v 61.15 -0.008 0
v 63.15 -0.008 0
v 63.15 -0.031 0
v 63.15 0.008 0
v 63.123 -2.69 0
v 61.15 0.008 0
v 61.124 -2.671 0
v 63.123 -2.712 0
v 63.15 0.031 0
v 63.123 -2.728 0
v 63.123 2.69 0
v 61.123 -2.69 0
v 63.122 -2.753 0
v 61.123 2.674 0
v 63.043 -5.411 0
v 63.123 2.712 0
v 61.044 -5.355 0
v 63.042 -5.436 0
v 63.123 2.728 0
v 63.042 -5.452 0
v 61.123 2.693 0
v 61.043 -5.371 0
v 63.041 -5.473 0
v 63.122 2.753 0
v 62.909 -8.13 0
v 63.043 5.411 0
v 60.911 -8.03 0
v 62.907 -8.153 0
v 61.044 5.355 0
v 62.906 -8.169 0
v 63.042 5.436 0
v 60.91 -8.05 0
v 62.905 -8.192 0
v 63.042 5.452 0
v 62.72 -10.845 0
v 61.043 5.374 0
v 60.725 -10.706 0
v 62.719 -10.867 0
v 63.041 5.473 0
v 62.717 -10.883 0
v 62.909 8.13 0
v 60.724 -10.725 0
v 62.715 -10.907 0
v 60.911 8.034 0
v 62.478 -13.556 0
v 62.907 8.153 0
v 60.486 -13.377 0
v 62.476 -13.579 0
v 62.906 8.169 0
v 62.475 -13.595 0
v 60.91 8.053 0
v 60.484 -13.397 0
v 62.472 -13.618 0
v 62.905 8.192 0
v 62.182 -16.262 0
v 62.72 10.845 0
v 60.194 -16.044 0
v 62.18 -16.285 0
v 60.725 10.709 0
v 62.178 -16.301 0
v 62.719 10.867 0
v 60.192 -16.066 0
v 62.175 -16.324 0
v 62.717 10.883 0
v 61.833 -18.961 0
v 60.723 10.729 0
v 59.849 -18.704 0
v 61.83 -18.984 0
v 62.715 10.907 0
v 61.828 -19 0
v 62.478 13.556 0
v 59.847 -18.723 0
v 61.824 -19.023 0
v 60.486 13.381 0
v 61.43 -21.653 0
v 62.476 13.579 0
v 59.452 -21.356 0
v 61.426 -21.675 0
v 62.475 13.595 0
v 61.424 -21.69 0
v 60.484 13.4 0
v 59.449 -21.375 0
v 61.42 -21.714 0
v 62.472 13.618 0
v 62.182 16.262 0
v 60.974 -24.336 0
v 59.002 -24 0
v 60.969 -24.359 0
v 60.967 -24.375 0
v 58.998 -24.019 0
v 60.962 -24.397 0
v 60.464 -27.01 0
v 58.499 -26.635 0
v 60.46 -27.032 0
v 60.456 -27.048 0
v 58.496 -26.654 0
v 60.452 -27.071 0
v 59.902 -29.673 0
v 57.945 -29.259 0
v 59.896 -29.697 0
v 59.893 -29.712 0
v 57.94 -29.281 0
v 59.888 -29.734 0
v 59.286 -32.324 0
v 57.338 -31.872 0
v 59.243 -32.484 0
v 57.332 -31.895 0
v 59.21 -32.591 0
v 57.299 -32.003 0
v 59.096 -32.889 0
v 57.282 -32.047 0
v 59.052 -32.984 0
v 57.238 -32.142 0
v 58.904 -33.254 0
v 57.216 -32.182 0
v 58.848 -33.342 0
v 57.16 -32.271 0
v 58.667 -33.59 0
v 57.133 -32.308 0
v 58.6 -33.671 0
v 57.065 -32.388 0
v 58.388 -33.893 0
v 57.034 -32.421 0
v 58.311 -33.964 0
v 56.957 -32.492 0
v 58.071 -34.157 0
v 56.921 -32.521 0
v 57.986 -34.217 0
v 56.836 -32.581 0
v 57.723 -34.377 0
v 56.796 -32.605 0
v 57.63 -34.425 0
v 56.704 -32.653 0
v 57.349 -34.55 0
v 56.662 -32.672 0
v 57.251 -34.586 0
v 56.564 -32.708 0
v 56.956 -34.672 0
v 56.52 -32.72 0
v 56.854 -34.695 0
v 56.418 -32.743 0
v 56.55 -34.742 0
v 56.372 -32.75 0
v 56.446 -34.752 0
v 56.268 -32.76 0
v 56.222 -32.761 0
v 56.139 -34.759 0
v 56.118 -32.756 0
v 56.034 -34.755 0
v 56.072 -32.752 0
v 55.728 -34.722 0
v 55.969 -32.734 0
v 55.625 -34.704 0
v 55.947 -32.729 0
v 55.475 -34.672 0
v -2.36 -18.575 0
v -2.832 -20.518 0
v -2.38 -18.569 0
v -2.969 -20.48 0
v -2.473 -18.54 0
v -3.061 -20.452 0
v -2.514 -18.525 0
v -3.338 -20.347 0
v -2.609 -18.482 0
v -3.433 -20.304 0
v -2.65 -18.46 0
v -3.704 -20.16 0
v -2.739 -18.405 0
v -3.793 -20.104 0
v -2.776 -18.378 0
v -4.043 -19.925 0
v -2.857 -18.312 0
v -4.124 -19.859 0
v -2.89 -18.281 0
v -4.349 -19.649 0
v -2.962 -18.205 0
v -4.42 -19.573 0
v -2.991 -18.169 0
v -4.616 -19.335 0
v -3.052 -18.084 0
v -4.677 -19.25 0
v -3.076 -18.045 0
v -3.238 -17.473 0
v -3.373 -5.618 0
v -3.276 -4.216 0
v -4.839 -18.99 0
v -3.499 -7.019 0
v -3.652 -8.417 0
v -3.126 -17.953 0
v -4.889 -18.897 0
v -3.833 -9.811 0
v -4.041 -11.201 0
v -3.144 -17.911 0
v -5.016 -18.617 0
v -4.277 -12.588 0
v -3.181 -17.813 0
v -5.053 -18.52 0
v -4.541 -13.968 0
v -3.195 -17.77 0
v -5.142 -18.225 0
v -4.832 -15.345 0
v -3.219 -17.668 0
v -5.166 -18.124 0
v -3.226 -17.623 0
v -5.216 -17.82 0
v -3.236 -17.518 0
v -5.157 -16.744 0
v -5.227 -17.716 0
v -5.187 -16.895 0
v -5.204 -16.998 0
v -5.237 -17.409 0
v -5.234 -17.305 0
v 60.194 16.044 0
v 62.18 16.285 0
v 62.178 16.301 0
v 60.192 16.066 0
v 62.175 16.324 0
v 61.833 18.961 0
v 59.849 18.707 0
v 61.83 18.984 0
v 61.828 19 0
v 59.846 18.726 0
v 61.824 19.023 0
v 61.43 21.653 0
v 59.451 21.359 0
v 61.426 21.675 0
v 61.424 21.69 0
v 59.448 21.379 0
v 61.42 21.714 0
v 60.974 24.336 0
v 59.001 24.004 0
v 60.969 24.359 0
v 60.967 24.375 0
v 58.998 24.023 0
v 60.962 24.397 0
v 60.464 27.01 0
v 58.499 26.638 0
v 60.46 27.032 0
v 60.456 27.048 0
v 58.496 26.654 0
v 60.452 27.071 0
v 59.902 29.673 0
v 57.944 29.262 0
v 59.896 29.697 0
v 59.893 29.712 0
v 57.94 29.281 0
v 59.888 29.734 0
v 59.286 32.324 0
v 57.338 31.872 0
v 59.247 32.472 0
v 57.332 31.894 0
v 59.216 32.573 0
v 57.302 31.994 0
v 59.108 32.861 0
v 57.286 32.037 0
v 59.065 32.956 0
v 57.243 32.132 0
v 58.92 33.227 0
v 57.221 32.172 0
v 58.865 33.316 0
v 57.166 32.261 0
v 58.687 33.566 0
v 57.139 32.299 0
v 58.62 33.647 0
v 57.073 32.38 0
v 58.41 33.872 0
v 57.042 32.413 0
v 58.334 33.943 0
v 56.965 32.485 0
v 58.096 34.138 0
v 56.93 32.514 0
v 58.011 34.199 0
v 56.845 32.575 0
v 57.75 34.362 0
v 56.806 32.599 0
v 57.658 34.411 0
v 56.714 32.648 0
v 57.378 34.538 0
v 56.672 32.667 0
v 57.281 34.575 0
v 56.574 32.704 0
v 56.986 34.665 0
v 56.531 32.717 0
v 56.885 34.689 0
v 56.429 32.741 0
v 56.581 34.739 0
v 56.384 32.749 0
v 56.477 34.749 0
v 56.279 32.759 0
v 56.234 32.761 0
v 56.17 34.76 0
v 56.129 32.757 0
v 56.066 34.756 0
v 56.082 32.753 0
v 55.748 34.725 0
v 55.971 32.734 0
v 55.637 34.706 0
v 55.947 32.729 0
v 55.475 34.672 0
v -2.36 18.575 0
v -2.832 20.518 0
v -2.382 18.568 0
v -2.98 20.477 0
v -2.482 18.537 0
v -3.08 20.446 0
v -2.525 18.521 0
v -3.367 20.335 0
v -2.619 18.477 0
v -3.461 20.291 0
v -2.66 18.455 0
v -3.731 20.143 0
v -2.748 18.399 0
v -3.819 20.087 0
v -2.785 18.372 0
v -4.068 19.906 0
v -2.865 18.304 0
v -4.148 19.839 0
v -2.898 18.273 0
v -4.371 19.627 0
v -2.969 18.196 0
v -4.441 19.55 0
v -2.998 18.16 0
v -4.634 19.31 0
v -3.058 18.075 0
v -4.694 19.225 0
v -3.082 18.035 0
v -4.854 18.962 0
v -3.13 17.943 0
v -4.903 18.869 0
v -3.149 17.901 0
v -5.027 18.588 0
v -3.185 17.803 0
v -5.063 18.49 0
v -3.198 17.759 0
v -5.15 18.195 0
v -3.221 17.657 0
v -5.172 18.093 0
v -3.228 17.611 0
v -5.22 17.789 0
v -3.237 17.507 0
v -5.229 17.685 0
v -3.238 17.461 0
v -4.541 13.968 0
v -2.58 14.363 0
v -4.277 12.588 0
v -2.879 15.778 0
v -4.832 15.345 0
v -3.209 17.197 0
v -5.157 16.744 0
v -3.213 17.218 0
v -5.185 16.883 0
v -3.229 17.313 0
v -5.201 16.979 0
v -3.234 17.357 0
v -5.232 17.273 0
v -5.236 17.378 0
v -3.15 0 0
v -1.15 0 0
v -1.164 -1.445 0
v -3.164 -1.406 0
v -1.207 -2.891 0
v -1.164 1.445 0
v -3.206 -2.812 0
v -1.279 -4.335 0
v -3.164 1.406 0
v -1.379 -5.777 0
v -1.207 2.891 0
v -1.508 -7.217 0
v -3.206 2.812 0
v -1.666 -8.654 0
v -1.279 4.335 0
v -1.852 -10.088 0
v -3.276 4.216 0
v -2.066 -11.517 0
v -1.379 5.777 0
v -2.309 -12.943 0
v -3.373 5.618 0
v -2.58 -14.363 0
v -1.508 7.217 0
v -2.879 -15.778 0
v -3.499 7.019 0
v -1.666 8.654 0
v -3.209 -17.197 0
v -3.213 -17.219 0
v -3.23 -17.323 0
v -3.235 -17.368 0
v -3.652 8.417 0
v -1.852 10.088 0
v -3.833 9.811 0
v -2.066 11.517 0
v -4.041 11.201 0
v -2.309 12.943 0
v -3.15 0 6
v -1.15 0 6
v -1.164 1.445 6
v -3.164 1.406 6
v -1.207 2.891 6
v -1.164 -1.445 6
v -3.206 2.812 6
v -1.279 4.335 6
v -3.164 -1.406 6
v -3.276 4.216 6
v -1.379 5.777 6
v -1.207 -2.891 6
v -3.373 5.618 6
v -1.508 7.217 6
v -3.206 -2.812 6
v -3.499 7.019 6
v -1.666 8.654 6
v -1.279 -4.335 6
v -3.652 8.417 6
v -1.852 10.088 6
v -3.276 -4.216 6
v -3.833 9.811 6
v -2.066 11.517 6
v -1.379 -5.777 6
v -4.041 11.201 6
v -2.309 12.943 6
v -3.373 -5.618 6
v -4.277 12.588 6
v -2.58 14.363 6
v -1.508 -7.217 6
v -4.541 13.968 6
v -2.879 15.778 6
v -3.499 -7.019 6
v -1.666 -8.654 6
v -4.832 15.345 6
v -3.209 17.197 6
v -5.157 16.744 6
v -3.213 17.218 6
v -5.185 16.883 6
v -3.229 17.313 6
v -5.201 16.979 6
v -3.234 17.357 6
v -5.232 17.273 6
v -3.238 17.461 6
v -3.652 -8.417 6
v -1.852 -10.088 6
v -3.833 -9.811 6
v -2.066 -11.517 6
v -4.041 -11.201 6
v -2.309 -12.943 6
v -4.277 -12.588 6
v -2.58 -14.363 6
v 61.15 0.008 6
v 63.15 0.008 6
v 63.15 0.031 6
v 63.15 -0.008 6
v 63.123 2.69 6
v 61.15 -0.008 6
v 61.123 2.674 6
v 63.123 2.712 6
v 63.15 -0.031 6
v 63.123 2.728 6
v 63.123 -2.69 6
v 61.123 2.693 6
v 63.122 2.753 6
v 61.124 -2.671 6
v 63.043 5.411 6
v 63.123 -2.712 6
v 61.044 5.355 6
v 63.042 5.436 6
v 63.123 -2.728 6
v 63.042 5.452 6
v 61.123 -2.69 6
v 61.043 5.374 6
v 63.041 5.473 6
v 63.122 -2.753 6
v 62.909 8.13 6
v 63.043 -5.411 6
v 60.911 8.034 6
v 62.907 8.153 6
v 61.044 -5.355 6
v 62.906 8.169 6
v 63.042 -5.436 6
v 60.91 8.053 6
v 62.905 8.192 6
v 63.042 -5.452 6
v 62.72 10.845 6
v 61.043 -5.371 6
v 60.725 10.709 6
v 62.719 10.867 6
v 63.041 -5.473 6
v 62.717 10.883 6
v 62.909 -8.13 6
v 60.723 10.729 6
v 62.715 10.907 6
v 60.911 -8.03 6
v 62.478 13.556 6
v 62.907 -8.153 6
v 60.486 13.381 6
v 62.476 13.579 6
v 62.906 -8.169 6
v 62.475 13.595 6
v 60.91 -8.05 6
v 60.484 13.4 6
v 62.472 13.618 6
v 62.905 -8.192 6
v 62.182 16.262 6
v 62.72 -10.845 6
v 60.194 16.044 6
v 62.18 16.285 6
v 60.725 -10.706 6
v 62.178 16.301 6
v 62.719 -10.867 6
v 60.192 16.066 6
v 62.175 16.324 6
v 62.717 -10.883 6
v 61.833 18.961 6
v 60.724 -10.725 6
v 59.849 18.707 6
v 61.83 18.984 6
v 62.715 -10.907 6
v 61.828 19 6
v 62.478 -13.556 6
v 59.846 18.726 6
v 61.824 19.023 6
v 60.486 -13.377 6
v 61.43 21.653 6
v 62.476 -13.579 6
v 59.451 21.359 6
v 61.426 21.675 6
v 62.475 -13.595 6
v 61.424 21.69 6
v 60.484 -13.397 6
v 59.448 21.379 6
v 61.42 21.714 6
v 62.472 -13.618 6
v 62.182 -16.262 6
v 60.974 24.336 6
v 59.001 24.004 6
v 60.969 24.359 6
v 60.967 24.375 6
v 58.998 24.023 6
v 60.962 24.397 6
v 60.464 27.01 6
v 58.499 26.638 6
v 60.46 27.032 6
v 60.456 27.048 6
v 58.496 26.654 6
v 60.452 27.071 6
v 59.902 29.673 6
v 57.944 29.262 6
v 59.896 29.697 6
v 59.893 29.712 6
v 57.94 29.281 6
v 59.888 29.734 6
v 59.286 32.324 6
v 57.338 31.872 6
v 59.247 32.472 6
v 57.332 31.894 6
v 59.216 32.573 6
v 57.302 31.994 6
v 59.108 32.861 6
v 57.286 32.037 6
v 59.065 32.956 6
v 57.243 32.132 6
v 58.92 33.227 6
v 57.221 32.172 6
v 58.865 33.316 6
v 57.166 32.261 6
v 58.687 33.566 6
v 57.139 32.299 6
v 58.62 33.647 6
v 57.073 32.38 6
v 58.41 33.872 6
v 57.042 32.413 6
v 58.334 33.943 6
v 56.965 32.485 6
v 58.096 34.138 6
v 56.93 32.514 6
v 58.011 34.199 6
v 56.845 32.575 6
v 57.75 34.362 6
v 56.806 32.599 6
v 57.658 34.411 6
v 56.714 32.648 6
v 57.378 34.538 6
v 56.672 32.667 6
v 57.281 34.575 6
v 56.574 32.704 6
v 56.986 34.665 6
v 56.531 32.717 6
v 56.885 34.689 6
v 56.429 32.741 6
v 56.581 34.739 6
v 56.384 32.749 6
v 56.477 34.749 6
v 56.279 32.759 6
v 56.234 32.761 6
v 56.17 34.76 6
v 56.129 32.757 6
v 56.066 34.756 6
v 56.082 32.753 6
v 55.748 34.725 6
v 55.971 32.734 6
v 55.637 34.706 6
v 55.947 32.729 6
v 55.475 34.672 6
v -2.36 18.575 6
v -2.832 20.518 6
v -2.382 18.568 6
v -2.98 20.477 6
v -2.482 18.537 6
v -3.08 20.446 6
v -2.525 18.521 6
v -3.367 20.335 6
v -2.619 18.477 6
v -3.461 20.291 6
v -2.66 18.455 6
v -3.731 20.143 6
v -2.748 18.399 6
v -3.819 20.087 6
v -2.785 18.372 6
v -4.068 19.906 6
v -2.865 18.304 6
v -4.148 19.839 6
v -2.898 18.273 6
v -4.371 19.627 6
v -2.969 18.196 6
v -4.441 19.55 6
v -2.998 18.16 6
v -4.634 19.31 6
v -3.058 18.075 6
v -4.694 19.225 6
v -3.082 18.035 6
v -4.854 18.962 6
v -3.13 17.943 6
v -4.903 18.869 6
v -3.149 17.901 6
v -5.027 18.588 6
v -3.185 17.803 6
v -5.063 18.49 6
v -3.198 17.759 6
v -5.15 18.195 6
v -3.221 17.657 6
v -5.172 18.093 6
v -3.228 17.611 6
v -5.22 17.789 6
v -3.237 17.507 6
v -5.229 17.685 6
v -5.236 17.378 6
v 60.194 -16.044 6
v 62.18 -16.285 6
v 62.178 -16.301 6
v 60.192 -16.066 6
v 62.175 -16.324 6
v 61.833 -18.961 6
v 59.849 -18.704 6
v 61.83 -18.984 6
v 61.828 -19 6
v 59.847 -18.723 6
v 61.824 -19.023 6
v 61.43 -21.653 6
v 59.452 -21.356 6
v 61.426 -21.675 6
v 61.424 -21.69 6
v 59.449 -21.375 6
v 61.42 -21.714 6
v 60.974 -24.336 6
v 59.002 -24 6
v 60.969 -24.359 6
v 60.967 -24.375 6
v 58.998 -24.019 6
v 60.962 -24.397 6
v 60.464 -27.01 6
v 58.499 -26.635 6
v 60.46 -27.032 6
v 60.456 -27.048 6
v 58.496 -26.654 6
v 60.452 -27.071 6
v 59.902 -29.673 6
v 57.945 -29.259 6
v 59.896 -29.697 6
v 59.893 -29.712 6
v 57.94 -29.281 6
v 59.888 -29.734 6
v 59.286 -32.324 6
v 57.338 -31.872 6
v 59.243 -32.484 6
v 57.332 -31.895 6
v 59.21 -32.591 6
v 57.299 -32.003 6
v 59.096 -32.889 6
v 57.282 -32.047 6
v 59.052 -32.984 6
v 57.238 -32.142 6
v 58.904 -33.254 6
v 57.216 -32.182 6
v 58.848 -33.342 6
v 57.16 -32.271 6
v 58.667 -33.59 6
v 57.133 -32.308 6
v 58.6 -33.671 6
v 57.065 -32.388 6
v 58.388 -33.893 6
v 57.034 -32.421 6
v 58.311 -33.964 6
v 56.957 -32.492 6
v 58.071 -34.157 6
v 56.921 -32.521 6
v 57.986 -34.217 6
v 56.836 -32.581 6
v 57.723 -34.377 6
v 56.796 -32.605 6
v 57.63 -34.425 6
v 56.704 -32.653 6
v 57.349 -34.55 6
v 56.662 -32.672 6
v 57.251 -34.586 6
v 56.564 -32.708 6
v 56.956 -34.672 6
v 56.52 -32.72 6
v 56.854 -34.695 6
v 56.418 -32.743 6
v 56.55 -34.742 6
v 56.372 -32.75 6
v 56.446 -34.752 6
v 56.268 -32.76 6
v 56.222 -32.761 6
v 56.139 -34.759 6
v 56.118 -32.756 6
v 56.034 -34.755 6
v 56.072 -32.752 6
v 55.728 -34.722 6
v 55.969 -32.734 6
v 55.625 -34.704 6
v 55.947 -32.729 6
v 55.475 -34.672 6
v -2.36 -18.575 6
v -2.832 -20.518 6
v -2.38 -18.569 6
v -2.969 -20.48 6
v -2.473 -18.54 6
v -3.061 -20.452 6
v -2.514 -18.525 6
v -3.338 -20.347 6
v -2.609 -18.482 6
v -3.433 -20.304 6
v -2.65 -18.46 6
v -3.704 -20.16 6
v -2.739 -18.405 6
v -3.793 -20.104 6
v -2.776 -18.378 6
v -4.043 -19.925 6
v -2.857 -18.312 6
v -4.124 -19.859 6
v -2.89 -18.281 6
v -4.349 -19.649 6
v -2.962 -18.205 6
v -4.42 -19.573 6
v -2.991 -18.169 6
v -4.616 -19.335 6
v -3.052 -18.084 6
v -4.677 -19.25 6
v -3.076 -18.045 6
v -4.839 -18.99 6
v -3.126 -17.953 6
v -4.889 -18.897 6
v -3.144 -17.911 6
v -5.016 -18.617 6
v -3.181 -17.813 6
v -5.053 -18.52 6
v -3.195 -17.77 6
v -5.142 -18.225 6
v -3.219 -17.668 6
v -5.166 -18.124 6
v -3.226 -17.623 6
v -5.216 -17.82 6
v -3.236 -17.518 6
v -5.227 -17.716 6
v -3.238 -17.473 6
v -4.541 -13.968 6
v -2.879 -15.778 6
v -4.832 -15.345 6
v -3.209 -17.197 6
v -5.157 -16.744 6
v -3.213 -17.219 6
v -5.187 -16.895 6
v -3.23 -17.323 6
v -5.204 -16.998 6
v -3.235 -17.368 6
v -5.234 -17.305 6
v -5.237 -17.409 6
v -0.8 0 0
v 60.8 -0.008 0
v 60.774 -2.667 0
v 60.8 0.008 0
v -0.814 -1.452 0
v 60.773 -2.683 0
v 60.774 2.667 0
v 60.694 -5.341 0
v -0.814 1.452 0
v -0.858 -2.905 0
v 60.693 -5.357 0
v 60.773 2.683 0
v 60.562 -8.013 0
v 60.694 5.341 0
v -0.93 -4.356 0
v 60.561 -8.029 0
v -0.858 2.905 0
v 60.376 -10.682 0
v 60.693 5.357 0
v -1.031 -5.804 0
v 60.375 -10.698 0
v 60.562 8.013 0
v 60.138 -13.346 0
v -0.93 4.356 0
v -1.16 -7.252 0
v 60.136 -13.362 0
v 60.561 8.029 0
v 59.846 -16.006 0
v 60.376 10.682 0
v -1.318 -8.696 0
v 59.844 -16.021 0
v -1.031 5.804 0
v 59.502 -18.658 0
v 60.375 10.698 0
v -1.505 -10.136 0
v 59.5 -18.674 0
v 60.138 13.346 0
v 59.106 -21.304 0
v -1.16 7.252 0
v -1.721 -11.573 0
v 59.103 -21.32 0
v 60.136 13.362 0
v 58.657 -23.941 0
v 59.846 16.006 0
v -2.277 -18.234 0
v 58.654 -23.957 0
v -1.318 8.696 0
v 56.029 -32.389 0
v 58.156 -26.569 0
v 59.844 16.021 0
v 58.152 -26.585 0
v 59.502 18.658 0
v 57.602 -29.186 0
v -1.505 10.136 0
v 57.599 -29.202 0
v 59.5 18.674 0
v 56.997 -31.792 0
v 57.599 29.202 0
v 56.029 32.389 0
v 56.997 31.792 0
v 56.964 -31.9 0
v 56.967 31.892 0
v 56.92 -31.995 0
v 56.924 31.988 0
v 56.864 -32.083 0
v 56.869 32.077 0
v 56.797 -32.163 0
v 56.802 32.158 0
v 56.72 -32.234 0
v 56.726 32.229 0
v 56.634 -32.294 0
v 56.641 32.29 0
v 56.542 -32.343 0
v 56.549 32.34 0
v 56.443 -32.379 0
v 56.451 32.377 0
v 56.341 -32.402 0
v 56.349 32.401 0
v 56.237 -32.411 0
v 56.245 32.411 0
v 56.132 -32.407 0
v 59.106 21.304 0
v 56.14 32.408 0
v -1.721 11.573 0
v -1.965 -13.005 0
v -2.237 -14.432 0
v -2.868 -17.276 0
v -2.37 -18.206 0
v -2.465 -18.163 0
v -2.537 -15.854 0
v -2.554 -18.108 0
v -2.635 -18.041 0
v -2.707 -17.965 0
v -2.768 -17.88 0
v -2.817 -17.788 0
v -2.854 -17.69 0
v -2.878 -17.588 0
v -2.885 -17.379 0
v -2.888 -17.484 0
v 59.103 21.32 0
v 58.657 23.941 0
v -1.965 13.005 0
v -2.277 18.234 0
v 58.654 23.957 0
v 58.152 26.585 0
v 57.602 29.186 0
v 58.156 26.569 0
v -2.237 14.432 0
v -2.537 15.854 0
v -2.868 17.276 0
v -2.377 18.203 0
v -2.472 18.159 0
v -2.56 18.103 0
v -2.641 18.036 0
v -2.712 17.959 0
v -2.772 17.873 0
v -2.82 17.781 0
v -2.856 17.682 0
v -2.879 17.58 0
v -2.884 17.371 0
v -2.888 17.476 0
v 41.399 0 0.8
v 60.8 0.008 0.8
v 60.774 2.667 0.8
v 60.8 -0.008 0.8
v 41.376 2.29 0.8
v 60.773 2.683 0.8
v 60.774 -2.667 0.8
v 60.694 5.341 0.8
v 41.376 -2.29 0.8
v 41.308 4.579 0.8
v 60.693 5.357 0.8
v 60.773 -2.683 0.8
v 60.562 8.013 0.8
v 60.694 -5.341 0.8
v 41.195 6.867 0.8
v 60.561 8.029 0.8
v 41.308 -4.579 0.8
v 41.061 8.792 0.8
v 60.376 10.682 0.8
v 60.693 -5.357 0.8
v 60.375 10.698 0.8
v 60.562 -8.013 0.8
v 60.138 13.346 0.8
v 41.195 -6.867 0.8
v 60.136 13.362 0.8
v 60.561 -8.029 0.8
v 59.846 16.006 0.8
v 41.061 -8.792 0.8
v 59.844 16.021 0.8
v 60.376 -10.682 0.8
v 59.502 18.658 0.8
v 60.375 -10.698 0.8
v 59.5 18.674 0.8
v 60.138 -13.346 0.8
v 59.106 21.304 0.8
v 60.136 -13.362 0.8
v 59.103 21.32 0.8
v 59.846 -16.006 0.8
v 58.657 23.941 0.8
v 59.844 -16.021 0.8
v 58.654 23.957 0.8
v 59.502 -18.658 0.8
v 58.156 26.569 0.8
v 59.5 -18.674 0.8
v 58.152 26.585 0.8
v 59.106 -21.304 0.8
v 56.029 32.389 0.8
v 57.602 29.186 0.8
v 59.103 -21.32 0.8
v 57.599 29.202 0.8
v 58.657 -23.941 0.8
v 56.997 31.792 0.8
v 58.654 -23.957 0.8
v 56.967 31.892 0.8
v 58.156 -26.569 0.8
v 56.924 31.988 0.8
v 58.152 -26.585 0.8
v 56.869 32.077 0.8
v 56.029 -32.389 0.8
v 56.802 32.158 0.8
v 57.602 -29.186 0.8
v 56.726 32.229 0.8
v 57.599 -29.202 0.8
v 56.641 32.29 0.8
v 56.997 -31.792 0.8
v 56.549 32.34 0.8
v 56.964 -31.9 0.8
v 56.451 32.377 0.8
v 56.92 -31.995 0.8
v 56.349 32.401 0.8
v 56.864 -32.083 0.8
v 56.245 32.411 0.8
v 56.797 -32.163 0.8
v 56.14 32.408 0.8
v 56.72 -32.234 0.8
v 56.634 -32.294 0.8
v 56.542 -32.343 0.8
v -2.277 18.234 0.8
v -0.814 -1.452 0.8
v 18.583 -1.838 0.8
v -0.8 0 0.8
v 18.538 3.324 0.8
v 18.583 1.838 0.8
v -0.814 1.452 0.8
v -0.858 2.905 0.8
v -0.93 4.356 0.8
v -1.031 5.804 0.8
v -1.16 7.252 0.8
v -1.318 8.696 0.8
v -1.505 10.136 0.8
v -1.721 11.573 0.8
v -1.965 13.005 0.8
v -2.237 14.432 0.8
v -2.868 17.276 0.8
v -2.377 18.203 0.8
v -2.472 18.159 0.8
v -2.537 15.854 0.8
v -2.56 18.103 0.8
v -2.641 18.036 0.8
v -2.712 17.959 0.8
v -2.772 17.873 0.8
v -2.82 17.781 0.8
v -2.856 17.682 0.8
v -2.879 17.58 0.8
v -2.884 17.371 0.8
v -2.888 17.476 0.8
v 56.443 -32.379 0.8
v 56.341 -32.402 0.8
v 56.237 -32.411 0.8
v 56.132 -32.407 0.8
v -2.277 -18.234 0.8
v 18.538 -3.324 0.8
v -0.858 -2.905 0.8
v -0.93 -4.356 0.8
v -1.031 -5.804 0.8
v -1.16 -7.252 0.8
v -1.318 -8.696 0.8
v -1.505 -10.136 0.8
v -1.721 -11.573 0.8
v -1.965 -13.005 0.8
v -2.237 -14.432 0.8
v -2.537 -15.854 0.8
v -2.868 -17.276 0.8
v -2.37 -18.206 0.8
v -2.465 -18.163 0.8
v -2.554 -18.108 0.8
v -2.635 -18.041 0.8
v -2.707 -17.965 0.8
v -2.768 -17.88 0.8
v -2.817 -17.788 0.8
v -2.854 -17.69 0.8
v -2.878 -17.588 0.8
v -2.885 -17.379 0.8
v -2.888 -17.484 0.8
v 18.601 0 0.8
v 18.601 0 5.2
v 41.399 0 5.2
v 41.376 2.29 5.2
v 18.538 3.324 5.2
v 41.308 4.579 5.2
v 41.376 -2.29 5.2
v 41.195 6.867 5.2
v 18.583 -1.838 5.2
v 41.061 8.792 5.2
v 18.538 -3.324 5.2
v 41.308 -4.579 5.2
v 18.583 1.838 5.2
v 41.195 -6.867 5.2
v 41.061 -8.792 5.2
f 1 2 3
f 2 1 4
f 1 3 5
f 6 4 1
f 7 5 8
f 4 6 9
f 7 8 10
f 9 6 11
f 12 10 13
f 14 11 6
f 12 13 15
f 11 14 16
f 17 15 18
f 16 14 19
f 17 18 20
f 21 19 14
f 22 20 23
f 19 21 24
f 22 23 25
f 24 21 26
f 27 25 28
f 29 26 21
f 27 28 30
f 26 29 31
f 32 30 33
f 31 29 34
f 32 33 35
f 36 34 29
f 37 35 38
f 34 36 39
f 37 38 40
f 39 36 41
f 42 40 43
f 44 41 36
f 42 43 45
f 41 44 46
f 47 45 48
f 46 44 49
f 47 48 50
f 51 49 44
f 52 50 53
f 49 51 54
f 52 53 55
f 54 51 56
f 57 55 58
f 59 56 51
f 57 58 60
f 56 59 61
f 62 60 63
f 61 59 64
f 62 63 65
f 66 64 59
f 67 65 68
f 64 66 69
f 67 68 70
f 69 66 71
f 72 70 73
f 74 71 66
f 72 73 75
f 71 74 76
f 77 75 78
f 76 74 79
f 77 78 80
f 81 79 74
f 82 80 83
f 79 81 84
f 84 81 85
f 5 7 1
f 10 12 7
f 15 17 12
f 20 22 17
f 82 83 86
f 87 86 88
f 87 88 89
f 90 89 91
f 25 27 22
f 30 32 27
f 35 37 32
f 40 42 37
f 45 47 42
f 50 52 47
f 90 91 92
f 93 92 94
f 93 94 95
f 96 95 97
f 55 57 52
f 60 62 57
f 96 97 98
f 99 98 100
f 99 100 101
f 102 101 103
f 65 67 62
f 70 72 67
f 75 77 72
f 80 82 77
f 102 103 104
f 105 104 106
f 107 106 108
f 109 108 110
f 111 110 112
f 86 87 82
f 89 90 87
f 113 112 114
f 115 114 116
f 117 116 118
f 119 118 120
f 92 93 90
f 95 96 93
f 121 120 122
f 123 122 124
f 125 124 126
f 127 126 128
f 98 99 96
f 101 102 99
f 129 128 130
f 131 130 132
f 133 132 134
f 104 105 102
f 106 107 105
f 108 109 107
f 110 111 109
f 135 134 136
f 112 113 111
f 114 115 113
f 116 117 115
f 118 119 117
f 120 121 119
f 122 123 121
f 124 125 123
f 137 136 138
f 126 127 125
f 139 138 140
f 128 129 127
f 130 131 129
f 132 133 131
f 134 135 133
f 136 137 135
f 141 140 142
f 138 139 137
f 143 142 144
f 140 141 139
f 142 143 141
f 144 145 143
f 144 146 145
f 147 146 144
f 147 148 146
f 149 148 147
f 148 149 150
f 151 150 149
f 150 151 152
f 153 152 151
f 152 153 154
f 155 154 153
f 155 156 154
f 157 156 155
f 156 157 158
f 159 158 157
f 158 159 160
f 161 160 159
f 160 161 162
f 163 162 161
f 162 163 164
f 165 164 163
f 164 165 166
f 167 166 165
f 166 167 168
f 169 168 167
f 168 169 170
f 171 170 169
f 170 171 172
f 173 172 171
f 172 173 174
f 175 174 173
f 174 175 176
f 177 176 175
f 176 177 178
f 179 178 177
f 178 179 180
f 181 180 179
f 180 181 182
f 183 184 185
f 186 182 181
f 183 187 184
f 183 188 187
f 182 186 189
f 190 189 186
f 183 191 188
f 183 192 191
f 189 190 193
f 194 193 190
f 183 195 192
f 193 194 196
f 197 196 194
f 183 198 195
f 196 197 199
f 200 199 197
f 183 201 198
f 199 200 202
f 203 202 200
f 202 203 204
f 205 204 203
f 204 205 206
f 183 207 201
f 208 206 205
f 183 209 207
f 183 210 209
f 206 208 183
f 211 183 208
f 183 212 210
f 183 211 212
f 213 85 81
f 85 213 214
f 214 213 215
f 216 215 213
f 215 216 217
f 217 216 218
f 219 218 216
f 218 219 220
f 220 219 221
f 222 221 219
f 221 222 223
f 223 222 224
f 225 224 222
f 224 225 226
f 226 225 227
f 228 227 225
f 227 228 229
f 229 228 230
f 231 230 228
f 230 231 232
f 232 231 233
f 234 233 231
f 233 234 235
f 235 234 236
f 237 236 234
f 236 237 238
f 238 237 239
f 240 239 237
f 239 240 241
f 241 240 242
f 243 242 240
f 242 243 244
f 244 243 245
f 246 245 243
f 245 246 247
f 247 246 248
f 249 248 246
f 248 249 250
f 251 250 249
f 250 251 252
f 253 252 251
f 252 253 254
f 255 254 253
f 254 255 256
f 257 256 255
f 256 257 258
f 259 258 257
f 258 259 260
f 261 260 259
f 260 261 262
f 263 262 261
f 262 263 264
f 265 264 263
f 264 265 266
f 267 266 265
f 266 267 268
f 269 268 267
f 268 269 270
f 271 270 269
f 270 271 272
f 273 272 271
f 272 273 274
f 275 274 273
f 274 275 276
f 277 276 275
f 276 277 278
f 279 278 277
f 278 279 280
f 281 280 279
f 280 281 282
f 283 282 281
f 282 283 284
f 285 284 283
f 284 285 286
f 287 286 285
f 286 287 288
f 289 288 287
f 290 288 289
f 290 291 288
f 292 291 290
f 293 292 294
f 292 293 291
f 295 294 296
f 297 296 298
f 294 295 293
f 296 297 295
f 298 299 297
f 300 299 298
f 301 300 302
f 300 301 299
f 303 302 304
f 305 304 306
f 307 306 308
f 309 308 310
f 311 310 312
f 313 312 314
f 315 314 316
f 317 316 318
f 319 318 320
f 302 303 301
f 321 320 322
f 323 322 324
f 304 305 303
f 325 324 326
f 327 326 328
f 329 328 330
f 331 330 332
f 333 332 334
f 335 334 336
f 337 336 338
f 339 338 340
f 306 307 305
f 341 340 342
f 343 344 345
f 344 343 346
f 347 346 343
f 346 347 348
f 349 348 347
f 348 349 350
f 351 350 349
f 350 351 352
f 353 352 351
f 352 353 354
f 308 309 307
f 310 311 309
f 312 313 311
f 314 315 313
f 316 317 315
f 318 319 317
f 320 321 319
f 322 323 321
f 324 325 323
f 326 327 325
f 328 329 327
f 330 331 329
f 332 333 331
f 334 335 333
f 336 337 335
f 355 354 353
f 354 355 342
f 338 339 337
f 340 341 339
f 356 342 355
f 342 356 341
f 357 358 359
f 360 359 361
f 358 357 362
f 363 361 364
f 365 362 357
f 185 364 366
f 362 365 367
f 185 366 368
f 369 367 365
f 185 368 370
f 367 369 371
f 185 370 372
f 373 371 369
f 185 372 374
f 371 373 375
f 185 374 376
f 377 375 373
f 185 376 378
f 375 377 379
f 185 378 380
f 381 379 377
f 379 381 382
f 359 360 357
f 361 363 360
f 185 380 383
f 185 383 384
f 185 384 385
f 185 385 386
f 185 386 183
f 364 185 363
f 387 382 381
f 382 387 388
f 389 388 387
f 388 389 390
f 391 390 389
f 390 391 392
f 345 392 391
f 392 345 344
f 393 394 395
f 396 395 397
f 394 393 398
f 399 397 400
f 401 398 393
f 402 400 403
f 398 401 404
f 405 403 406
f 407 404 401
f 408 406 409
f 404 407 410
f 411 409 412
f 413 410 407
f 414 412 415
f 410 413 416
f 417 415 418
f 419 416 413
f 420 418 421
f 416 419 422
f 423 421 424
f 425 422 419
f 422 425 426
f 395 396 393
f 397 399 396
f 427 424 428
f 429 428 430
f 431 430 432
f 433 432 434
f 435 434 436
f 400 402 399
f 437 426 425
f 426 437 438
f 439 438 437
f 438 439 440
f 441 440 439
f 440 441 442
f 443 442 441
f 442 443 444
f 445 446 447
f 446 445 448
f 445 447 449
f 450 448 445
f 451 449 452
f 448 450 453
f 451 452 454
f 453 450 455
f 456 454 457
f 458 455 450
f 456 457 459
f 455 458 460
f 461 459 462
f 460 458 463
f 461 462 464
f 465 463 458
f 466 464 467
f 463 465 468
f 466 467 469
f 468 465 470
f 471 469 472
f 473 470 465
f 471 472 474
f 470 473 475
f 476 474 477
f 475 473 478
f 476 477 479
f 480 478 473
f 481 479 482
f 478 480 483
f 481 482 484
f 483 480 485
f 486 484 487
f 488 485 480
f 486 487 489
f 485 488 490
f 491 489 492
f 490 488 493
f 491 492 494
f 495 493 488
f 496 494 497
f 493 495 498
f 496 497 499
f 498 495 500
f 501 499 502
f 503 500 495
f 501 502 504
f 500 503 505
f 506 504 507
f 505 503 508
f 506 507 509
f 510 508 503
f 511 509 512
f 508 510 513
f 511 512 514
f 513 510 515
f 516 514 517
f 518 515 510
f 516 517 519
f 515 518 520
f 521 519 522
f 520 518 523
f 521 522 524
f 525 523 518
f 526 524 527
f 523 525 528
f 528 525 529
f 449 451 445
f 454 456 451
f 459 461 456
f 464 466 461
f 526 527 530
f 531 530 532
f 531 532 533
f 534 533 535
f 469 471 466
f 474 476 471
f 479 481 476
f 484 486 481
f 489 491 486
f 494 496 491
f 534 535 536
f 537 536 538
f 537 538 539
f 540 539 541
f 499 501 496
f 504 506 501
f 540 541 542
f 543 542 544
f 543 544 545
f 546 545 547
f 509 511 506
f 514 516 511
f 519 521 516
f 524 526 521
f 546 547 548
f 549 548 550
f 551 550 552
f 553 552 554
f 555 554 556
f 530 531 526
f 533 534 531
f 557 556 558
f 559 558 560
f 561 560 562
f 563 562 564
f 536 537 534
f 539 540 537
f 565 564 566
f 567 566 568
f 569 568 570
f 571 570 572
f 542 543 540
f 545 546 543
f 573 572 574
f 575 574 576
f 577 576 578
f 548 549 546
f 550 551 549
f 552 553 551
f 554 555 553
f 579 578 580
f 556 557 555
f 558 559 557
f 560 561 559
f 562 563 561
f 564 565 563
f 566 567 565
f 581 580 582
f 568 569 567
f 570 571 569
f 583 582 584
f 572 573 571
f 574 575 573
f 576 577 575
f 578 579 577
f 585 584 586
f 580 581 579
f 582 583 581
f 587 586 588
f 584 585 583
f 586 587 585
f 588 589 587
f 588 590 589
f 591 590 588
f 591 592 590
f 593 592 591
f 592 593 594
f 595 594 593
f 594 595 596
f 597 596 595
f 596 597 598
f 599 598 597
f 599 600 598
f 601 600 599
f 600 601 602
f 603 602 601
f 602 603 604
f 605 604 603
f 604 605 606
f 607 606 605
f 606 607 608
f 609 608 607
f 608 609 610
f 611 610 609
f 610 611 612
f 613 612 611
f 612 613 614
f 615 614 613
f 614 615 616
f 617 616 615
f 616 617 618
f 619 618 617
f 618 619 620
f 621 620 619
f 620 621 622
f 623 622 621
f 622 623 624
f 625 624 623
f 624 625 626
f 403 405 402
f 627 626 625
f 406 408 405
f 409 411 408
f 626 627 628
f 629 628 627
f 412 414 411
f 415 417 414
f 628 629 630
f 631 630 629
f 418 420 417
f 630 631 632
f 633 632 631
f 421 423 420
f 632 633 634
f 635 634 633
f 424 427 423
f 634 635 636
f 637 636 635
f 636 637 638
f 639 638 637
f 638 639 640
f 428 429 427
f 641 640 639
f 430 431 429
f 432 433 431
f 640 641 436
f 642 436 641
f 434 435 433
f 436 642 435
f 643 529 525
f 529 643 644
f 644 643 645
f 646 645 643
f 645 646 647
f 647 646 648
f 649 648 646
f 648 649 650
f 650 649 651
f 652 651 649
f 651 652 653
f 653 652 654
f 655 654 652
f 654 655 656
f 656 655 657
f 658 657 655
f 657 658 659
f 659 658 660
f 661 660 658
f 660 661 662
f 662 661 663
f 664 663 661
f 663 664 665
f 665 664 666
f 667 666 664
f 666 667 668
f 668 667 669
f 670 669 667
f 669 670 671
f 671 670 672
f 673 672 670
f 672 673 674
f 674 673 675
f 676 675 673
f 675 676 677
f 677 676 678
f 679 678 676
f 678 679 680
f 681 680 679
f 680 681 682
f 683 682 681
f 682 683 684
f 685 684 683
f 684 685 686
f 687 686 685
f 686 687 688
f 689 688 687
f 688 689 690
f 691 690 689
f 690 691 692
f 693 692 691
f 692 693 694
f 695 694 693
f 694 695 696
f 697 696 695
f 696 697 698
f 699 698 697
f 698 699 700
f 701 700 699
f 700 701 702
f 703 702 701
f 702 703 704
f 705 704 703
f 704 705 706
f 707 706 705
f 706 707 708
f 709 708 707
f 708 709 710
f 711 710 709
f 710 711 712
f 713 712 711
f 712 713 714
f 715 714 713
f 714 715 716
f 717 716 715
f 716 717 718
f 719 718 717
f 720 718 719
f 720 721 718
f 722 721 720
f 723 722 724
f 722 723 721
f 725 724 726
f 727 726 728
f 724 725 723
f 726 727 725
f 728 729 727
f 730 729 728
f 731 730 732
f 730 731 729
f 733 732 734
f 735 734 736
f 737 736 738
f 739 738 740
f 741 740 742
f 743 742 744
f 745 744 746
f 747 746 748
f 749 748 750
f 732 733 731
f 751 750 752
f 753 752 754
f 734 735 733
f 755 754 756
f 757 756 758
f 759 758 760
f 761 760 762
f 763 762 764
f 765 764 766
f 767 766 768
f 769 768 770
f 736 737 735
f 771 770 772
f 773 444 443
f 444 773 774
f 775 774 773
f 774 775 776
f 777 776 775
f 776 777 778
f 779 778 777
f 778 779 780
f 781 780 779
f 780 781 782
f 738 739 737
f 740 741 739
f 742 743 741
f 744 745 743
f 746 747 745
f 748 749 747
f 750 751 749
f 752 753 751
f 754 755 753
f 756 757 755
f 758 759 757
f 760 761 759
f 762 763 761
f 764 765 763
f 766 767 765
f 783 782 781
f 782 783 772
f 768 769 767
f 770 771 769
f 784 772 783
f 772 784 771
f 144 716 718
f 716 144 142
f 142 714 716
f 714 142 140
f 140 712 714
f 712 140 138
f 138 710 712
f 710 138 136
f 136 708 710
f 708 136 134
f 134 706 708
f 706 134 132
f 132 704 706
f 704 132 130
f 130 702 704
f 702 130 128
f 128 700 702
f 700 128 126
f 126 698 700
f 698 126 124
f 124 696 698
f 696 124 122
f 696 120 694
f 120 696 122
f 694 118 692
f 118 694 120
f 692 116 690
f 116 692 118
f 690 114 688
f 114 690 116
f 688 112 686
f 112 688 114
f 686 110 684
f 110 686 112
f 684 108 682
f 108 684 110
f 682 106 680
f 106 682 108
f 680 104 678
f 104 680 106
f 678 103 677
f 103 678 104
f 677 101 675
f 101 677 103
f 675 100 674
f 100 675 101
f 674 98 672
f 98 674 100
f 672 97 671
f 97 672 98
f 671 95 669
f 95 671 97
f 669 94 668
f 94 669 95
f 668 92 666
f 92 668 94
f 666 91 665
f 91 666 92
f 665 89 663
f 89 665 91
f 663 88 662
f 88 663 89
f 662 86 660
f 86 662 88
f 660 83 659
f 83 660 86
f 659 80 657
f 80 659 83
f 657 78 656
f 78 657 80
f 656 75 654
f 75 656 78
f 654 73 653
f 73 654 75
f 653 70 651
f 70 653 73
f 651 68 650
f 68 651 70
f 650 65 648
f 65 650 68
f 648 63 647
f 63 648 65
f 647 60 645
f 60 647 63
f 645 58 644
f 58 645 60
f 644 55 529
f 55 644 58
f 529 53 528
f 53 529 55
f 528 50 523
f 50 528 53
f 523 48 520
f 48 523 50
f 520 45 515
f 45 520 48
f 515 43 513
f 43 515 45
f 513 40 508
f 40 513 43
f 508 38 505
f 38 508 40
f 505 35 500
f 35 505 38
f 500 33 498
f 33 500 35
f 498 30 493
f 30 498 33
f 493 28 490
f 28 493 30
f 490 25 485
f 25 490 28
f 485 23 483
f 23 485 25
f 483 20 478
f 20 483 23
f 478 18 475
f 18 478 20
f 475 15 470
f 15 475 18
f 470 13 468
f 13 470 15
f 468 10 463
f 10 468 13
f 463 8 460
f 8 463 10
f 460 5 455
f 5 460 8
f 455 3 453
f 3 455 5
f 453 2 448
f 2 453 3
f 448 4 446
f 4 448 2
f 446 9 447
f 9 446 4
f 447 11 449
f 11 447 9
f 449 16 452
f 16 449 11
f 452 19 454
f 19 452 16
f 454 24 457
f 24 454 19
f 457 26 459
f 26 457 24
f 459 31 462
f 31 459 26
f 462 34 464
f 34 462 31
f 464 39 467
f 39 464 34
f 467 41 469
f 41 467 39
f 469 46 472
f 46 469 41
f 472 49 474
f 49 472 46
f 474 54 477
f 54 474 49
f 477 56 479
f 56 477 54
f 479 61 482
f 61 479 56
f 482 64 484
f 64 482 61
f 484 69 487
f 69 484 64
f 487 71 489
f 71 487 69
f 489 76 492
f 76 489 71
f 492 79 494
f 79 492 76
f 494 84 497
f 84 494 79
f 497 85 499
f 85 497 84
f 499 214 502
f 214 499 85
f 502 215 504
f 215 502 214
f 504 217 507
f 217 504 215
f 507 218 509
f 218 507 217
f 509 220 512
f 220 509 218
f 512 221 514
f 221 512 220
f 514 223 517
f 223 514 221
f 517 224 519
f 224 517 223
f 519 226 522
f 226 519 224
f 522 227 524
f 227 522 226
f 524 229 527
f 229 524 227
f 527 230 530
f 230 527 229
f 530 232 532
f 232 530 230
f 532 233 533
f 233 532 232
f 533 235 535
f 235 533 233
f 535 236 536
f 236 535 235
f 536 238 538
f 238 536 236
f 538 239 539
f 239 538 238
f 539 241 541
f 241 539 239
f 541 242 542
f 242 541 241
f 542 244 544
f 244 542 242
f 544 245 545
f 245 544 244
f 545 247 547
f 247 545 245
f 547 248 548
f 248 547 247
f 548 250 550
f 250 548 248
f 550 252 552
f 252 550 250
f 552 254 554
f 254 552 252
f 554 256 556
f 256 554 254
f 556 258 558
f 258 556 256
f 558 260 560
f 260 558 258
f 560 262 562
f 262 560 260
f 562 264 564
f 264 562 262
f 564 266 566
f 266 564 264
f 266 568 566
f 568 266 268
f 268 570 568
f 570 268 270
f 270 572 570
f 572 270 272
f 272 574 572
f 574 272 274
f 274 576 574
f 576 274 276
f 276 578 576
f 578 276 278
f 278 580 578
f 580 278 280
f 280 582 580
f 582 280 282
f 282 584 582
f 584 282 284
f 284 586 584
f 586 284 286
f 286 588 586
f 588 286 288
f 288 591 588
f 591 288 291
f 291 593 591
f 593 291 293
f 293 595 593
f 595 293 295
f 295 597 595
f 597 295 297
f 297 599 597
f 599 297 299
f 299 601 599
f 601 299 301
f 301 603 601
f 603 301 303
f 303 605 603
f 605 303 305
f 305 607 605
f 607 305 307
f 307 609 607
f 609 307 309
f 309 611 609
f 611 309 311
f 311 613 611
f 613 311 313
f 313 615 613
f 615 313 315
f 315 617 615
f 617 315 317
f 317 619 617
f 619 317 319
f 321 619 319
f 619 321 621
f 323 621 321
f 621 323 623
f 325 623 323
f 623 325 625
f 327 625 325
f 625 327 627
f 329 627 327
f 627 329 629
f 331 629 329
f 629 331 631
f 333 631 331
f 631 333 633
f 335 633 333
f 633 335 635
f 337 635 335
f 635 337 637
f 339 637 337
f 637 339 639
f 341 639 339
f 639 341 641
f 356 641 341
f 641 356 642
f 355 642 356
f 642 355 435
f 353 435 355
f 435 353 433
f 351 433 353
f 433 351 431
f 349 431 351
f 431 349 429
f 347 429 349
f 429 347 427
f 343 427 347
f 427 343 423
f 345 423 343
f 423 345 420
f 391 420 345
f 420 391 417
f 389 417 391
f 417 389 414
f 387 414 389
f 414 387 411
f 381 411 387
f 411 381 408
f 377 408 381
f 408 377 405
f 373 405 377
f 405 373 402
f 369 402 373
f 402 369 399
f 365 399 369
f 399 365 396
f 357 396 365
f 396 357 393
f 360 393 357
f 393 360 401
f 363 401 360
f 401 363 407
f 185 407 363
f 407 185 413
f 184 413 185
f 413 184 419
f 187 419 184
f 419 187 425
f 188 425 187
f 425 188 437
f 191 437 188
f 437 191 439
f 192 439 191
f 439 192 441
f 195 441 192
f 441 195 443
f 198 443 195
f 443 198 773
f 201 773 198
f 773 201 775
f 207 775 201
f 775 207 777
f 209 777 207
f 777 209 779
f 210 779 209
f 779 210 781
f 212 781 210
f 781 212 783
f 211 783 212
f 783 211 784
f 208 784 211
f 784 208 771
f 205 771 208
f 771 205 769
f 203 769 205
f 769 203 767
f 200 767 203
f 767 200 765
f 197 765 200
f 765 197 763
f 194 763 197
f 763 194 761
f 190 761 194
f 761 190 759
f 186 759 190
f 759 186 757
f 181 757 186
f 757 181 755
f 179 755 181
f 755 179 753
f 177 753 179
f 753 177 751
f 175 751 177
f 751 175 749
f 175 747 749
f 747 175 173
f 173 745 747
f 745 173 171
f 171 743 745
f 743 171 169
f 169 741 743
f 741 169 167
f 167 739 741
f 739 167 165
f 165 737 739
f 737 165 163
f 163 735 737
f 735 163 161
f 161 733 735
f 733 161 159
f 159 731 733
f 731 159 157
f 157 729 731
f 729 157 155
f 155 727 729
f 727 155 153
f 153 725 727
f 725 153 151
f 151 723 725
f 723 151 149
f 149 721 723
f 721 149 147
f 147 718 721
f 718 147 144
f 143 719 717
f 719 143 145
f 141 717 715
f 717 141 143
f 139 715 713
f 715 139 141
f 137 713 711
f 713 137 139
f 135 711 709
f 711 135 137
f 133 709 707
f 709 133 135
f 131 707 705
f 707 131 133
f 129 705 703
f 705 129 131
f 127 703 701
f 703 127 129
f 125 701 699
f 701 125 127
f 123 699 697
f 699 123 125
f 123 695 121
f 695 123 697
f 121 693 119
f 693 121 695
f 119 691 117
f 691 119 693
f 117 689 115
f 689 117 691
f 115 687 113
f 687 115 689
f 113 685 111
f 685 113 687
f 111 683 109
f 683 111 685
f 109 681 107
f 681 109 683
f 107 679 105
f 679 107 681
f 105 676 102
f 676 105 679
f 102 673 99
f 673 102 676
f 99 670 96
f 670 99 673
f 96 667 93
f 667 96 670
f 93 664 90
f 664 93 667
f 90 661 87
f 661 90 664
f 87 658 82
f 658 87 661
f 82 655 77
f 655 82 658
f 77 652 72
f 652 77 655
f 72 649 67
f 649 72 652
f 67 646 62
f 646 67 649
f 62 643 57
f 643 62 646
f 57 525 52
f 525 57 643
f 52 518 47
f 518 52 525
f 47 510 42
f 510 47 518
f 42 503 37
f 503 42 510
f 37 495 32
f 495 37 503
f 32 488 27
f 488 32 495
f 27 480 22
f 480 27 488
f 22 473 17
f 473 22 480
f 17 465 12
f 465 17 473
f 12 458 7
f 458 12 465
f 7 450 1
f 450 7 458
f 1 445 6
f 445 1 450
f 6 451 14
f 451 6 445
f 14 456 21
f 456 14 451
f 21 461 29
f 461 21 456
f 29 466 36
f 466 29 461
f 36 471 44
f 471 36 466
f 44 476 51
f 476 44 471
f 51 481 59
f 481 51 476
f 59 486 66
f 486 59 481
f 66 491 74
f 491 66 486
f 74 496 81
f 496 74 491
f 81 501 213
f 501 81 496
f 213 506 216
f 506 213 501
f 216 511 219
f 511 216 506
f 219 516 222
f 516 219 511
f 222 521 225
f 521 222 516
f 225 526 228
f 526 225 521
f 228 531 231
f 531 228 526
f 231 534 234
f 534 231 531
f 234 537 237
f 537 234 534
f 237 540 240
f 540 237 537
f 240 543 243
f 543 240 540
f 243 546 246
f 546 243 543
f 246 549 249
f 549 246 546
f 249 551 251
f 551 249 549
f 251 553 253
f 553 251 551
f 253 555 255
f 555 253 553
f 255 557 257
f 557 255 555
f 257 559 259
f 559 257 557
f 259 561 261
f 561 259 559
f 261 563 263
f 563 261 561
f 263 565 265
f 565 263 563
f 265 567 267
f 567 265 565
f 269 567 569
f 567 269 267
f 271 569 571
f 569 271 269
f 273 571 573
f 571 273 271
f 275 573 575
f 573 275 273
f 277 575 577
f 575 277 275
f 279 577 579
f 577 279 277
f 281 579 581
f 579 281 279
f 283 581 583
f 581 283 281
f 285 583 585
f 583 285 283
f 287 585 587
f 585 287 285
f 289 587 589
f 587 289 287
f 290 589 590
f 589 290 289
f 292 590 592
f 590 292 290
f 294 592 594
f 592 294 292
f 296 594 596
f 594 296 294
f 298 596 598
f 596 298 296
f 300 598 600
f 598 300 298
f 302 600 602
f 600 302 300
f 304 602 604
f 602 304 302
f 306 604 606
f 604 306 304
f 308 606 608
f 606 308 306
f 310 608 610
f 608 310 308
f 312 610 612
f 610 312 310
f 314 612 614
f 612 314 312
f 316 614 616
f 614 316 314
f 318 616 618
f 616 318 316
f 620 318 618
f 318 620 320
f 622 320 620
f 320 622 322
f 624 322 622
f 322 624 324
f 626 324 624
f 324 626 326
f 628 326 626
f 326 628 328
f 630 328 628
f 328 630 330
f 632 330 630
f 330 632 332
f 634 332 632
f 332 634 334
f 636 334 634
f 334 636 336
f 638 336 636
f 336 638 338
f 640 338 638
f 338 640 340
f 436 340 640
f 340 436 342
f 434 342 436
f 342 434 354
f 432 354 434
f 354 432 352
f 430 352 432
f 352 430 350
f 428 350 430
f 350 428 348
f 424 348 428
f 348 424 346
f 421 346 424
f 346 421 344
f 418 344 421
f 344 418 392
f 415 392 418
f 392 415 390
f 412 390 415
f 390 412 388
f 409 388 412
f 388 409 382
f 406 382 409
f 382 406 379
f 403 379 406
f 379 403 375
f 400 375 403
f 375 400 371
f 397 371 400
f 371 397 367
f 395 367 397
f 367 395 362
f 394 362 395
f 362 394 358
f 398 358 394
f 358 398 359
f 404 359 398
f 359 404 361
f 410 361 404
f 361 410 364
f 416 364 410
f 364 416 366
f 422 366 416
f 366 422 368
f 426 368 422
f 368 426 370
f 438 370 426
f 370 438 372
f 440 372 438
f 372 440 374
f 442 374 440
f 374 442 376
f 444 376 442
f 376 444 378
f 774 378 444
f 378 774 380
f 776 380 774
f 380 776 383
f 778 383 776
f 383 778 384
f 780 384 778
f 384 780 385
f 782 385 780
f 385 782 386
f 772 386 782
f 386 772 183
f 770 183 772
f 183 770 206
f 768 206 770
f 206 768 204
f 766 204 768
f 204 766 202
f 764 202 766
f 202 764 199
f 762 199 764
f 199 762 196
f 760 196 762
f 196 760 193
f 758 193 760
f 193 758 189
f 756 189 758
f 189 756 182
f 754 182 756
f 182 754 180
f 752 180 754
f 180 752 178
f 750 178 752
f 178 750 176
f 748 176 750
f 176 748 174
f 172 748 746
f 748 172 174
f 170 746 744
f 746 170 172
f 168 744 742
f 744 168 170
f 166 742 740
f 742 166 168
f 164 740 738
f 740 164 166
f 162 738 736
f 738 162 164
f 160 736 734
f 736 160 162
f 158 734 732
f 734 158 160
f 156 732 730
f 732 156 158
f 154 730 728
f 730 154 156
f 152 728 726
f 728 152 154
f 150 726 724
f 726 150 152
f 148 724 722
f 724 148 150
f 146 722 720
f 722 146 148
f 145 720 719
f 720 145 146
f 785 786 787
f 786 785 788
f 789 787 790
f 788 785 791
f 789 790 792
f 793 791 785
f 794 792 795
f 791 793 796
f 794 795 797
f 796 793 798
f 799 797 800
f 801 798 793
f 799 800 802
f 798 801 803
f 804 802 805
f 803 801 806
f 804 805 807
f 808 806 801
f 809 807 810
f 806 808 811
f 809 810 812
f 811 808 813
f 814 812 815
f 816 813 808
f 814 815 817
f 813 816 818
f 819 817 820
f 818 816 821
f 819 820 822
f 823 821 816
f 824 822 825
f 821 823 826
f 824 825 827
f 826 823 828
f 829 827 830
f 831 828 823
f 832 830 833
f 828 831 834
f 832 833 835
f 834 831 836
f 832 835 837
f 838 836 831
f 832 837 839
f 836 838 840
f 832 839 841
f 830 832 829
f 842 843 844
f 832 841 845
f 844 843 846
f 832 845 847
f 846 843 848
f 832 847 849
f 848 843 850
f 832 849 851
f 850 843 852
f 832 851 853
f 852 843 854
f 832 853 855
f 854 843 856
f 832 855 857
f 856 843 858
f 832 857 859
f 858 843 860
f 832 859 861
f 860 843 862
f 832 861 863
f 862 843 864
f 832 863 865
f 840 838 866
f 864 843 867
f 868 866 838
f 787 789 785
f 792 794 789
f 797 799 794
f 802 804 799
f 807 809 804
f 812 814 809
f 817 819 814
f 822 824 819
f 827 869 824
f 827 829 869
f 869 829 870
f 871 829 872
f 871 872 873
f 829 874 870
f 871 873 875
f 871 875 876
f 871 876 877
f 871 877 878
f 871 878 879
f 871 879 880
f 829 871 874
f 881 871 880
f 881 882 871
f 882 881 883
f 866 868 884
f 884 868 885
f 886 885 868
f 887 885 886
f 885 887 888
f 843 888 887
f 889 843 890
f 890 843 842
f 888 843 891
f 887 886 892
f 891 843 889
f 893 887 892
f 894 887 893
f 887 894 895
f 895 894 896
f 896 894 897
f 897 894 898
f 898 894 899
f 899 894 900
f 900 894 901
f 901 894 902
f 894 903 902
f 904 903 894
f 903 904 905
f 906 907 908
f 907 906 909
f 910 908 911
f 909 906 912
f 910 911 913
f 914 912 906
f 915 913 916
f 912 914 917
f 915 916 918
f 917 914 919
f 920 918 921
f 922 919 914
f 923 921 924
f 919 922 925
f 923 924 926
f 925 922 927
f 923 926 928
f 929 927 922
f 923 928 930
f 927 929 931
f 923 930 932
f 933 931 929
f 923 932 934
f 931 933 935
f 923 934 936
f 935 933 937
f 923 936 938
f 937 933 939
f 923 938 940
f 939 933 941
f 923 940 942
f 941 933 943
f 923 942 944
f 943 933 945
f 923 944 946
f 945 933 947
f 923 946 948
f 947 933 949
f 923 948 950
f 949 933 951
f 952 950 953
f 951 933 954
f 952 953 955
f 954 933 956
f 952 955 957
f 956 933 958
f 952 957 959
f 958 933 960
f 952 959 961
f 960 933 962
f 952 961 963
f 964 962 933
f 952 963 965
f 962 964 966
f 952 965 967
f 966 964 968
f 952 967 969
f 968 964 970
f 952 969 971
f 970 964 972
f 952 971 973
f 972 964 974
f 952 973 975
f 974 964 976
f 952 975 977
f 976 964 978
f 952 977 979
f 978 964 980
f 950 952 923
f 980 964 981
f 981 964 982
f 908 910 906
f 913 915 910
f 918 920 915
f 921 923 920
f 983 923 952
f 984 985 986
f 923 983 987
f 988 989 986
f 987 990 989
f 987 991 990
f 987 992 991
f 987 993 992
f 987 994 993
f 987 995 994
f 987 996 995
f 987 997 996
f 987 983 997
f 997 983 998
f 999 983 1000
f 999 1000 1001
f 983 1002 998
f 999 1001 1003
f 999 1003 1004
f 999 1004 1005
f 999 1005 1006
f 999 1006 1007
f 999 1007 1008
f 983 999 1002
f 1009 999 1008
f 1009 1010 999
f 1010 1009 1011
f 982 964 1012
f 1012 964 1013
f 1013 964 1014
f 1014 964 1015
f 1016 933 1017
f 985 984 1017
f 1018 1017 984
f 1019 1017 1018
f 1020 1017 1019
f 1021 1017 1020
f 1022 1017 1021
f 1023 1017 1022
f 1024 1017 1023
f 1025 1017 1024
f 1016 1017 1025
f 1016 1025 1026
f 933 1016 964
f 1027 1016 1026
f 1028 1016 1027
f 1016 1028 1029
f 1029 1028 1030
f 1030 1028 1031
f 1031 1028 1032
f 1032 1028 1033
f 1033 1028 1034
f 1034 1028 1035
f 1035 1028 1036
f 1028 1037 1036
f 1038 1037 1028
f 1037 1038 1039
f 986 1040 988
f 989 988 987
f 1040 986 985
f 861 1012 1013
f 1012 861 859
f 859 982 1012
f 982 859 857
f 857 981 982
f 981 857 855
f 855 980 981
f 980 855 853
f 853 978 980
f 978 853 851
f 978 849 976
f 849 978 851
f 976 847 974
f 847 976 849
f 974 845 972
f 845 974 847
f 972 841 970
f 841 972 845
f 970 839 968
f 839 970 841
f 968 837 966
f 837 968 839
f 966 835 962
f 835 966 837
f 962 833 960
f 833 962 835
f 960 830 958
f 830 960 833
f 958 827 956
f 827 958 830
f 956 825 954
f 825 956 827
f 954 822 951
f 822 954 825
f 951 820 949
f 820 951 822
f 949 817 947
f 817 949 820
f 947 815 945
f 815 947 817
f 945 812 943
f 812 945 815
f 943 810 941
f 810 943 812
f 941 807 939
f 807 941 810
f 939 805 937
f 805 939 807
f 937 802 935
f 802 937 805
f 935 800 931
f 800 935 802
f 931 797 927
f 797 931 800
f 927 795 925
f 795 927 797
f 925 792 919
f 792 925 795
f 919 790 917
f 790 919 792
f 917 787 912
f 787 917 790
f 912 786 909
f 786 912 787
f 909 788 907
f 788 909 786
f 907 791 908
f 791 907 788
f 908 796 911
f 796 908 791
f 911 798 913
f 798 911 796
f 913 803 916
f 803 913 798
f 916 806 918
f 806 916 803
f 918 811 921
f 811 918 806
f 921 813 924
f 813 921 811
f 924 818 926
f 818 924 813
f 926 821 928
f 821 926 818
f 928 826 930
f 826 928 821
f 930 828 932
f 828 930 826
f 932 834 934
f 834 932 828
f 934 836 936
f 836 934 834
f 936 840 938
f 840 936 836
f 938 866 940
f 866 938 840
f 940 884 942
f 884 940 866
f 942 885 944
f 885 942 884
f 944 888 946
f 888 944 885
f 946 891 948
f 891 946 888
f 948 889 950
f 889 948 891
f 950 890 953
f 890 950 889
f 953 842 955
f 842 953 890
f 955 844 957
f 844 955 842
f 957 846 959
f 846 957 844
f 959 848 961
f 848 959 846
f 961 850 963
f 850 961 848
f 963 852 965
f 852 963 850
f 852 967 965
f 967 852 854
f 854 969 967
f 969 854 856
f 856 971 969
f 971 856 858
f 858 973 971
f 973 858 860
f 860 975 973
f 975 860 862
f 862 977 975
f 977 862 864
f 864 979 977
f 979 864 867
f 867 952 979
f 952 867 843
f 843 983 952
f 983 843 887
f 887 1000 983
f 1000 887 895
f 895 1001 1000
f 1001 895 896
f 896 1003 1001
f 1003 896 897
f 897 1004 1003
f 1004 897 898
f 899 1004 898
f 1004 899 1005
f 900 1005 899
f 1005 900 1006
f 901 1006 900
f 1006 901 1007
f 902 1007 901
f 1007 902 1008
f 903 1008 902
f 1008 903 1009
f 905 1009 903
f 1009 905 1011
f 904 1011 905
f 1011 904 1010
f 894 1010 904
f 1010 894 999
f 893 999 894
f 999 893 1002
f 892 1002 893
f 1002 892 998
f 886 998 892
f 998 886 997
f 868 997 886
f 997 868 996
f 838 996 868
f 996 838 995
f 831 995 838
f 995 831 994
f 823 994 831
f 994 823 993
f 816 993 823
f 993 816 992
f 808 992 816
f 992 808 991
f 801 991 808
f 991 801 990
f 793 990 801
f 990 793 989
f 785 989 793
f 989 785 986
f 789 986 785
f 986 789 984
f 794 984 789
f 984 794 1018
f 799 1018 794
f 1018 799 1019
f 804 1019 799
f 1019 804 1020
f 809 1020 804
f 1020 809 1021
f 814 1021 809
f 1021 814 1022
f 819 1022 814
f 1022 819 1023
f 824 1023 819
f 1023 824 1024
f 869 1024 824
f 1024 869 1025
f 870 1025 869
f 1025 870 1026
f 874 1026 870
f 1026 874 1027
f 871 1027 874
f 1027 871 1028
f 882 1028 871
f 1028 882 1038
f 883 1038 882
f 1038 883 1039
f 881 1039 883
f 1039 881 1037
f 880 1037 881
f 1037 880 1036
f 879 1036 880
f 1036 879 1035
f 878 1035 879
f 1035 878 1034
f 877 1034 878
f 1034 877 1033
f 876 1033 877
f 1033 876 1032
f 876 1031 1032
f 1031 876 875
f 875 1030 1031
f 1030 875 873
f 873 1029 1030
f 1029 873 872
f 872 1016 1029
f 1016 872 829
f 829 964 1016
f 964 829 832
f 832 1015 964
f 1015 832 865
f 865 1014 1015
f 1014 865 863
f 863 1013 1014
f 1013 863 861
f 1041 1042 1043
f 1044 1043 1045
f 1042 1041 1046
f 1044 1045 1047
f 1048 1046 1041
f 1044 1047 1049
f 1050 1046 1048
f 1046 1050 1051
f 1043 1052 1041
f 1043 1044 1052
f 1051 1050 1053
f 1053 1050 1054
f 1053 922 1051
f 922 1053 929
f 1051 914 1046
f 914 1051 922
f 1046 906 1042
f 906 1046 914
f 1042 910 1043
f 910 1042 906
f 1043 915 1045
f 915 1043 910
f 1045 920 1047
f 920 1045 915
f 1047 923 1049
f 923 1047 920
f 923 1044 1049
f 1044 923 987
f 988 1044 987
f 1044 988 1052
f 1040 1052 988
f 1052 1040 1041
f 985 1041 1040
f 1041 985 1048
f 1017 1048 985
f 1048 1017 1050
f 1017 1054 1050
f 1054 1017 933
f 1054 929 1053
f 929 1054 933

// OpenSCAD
// Gen-DI — fit coupon (bay part): O20/O5 THROUGH pockets at carrier thickness (test on a steel offcut), 608 seat,
// D-flat bore, gap shim, and one bobbin-bay slice (bobbin footprint + bay_clear) to test former fit.
include <parameters.scad>;
$fn = 48;
// D-flat keyed bore: flat faces +X (angle 0 = magnet pocket 0 = index notch)
module dflat_bore(h) {
    intersection() {
        cylinder(d=shaft_bore, h=h);
        translate([-shaft_bore, -shaft_bore, 0]) cube([shaft_bore + dflat_x, 2*shaft_bore, h]);
    }
}
module sector_2d(r_in, r_out, ang) {
    polygon([
        for (a = [-ang/2 : ang/24 : ang/2]) [r_in*cos(a), r_in*sin(a)],
        for (a = [ang/2 : -ang/24 : -ang/2]) [r_out*cos(a), r_out*sin(a)]
    ]);
}
module footprint_2d() { offset(r=wall) sector_2d(coil_id_r, coil_od_r, span_deg); }
module hub_2d()       { offset(delta=-coil_core_inset) sector_2d(coil_id_r, coil_od_r, span_deg); }

// bay slice at FULL stator thickness with one bobbin BASE printed IN PLACE inside it (bay_clear gap): this is the
// print-in-place test for the one-plate stator. After printing, the base must pop out with finger pressure; if it is fused,
// print coil_former.stl separately (print-packs/parts/) instead of using the in-place bases.
translate([-coil_id_r, 0, 0]) {
    difference() {
        linear_extrude(stator_thick) offset(r=bay_clear + 2) footprint_2d();
        translate([0, 0, -0.1]) linear_extrude(stator_thick + 0.2) offset(r=bay_clear) footprint_2d();
    }
    union() {
        linear_extrude(flange_t) footprint_2d();
        translate([0, 0, flange_t - 0.01]) linear_extrude(former_web + 0.01) hub_2d();
    }
}
